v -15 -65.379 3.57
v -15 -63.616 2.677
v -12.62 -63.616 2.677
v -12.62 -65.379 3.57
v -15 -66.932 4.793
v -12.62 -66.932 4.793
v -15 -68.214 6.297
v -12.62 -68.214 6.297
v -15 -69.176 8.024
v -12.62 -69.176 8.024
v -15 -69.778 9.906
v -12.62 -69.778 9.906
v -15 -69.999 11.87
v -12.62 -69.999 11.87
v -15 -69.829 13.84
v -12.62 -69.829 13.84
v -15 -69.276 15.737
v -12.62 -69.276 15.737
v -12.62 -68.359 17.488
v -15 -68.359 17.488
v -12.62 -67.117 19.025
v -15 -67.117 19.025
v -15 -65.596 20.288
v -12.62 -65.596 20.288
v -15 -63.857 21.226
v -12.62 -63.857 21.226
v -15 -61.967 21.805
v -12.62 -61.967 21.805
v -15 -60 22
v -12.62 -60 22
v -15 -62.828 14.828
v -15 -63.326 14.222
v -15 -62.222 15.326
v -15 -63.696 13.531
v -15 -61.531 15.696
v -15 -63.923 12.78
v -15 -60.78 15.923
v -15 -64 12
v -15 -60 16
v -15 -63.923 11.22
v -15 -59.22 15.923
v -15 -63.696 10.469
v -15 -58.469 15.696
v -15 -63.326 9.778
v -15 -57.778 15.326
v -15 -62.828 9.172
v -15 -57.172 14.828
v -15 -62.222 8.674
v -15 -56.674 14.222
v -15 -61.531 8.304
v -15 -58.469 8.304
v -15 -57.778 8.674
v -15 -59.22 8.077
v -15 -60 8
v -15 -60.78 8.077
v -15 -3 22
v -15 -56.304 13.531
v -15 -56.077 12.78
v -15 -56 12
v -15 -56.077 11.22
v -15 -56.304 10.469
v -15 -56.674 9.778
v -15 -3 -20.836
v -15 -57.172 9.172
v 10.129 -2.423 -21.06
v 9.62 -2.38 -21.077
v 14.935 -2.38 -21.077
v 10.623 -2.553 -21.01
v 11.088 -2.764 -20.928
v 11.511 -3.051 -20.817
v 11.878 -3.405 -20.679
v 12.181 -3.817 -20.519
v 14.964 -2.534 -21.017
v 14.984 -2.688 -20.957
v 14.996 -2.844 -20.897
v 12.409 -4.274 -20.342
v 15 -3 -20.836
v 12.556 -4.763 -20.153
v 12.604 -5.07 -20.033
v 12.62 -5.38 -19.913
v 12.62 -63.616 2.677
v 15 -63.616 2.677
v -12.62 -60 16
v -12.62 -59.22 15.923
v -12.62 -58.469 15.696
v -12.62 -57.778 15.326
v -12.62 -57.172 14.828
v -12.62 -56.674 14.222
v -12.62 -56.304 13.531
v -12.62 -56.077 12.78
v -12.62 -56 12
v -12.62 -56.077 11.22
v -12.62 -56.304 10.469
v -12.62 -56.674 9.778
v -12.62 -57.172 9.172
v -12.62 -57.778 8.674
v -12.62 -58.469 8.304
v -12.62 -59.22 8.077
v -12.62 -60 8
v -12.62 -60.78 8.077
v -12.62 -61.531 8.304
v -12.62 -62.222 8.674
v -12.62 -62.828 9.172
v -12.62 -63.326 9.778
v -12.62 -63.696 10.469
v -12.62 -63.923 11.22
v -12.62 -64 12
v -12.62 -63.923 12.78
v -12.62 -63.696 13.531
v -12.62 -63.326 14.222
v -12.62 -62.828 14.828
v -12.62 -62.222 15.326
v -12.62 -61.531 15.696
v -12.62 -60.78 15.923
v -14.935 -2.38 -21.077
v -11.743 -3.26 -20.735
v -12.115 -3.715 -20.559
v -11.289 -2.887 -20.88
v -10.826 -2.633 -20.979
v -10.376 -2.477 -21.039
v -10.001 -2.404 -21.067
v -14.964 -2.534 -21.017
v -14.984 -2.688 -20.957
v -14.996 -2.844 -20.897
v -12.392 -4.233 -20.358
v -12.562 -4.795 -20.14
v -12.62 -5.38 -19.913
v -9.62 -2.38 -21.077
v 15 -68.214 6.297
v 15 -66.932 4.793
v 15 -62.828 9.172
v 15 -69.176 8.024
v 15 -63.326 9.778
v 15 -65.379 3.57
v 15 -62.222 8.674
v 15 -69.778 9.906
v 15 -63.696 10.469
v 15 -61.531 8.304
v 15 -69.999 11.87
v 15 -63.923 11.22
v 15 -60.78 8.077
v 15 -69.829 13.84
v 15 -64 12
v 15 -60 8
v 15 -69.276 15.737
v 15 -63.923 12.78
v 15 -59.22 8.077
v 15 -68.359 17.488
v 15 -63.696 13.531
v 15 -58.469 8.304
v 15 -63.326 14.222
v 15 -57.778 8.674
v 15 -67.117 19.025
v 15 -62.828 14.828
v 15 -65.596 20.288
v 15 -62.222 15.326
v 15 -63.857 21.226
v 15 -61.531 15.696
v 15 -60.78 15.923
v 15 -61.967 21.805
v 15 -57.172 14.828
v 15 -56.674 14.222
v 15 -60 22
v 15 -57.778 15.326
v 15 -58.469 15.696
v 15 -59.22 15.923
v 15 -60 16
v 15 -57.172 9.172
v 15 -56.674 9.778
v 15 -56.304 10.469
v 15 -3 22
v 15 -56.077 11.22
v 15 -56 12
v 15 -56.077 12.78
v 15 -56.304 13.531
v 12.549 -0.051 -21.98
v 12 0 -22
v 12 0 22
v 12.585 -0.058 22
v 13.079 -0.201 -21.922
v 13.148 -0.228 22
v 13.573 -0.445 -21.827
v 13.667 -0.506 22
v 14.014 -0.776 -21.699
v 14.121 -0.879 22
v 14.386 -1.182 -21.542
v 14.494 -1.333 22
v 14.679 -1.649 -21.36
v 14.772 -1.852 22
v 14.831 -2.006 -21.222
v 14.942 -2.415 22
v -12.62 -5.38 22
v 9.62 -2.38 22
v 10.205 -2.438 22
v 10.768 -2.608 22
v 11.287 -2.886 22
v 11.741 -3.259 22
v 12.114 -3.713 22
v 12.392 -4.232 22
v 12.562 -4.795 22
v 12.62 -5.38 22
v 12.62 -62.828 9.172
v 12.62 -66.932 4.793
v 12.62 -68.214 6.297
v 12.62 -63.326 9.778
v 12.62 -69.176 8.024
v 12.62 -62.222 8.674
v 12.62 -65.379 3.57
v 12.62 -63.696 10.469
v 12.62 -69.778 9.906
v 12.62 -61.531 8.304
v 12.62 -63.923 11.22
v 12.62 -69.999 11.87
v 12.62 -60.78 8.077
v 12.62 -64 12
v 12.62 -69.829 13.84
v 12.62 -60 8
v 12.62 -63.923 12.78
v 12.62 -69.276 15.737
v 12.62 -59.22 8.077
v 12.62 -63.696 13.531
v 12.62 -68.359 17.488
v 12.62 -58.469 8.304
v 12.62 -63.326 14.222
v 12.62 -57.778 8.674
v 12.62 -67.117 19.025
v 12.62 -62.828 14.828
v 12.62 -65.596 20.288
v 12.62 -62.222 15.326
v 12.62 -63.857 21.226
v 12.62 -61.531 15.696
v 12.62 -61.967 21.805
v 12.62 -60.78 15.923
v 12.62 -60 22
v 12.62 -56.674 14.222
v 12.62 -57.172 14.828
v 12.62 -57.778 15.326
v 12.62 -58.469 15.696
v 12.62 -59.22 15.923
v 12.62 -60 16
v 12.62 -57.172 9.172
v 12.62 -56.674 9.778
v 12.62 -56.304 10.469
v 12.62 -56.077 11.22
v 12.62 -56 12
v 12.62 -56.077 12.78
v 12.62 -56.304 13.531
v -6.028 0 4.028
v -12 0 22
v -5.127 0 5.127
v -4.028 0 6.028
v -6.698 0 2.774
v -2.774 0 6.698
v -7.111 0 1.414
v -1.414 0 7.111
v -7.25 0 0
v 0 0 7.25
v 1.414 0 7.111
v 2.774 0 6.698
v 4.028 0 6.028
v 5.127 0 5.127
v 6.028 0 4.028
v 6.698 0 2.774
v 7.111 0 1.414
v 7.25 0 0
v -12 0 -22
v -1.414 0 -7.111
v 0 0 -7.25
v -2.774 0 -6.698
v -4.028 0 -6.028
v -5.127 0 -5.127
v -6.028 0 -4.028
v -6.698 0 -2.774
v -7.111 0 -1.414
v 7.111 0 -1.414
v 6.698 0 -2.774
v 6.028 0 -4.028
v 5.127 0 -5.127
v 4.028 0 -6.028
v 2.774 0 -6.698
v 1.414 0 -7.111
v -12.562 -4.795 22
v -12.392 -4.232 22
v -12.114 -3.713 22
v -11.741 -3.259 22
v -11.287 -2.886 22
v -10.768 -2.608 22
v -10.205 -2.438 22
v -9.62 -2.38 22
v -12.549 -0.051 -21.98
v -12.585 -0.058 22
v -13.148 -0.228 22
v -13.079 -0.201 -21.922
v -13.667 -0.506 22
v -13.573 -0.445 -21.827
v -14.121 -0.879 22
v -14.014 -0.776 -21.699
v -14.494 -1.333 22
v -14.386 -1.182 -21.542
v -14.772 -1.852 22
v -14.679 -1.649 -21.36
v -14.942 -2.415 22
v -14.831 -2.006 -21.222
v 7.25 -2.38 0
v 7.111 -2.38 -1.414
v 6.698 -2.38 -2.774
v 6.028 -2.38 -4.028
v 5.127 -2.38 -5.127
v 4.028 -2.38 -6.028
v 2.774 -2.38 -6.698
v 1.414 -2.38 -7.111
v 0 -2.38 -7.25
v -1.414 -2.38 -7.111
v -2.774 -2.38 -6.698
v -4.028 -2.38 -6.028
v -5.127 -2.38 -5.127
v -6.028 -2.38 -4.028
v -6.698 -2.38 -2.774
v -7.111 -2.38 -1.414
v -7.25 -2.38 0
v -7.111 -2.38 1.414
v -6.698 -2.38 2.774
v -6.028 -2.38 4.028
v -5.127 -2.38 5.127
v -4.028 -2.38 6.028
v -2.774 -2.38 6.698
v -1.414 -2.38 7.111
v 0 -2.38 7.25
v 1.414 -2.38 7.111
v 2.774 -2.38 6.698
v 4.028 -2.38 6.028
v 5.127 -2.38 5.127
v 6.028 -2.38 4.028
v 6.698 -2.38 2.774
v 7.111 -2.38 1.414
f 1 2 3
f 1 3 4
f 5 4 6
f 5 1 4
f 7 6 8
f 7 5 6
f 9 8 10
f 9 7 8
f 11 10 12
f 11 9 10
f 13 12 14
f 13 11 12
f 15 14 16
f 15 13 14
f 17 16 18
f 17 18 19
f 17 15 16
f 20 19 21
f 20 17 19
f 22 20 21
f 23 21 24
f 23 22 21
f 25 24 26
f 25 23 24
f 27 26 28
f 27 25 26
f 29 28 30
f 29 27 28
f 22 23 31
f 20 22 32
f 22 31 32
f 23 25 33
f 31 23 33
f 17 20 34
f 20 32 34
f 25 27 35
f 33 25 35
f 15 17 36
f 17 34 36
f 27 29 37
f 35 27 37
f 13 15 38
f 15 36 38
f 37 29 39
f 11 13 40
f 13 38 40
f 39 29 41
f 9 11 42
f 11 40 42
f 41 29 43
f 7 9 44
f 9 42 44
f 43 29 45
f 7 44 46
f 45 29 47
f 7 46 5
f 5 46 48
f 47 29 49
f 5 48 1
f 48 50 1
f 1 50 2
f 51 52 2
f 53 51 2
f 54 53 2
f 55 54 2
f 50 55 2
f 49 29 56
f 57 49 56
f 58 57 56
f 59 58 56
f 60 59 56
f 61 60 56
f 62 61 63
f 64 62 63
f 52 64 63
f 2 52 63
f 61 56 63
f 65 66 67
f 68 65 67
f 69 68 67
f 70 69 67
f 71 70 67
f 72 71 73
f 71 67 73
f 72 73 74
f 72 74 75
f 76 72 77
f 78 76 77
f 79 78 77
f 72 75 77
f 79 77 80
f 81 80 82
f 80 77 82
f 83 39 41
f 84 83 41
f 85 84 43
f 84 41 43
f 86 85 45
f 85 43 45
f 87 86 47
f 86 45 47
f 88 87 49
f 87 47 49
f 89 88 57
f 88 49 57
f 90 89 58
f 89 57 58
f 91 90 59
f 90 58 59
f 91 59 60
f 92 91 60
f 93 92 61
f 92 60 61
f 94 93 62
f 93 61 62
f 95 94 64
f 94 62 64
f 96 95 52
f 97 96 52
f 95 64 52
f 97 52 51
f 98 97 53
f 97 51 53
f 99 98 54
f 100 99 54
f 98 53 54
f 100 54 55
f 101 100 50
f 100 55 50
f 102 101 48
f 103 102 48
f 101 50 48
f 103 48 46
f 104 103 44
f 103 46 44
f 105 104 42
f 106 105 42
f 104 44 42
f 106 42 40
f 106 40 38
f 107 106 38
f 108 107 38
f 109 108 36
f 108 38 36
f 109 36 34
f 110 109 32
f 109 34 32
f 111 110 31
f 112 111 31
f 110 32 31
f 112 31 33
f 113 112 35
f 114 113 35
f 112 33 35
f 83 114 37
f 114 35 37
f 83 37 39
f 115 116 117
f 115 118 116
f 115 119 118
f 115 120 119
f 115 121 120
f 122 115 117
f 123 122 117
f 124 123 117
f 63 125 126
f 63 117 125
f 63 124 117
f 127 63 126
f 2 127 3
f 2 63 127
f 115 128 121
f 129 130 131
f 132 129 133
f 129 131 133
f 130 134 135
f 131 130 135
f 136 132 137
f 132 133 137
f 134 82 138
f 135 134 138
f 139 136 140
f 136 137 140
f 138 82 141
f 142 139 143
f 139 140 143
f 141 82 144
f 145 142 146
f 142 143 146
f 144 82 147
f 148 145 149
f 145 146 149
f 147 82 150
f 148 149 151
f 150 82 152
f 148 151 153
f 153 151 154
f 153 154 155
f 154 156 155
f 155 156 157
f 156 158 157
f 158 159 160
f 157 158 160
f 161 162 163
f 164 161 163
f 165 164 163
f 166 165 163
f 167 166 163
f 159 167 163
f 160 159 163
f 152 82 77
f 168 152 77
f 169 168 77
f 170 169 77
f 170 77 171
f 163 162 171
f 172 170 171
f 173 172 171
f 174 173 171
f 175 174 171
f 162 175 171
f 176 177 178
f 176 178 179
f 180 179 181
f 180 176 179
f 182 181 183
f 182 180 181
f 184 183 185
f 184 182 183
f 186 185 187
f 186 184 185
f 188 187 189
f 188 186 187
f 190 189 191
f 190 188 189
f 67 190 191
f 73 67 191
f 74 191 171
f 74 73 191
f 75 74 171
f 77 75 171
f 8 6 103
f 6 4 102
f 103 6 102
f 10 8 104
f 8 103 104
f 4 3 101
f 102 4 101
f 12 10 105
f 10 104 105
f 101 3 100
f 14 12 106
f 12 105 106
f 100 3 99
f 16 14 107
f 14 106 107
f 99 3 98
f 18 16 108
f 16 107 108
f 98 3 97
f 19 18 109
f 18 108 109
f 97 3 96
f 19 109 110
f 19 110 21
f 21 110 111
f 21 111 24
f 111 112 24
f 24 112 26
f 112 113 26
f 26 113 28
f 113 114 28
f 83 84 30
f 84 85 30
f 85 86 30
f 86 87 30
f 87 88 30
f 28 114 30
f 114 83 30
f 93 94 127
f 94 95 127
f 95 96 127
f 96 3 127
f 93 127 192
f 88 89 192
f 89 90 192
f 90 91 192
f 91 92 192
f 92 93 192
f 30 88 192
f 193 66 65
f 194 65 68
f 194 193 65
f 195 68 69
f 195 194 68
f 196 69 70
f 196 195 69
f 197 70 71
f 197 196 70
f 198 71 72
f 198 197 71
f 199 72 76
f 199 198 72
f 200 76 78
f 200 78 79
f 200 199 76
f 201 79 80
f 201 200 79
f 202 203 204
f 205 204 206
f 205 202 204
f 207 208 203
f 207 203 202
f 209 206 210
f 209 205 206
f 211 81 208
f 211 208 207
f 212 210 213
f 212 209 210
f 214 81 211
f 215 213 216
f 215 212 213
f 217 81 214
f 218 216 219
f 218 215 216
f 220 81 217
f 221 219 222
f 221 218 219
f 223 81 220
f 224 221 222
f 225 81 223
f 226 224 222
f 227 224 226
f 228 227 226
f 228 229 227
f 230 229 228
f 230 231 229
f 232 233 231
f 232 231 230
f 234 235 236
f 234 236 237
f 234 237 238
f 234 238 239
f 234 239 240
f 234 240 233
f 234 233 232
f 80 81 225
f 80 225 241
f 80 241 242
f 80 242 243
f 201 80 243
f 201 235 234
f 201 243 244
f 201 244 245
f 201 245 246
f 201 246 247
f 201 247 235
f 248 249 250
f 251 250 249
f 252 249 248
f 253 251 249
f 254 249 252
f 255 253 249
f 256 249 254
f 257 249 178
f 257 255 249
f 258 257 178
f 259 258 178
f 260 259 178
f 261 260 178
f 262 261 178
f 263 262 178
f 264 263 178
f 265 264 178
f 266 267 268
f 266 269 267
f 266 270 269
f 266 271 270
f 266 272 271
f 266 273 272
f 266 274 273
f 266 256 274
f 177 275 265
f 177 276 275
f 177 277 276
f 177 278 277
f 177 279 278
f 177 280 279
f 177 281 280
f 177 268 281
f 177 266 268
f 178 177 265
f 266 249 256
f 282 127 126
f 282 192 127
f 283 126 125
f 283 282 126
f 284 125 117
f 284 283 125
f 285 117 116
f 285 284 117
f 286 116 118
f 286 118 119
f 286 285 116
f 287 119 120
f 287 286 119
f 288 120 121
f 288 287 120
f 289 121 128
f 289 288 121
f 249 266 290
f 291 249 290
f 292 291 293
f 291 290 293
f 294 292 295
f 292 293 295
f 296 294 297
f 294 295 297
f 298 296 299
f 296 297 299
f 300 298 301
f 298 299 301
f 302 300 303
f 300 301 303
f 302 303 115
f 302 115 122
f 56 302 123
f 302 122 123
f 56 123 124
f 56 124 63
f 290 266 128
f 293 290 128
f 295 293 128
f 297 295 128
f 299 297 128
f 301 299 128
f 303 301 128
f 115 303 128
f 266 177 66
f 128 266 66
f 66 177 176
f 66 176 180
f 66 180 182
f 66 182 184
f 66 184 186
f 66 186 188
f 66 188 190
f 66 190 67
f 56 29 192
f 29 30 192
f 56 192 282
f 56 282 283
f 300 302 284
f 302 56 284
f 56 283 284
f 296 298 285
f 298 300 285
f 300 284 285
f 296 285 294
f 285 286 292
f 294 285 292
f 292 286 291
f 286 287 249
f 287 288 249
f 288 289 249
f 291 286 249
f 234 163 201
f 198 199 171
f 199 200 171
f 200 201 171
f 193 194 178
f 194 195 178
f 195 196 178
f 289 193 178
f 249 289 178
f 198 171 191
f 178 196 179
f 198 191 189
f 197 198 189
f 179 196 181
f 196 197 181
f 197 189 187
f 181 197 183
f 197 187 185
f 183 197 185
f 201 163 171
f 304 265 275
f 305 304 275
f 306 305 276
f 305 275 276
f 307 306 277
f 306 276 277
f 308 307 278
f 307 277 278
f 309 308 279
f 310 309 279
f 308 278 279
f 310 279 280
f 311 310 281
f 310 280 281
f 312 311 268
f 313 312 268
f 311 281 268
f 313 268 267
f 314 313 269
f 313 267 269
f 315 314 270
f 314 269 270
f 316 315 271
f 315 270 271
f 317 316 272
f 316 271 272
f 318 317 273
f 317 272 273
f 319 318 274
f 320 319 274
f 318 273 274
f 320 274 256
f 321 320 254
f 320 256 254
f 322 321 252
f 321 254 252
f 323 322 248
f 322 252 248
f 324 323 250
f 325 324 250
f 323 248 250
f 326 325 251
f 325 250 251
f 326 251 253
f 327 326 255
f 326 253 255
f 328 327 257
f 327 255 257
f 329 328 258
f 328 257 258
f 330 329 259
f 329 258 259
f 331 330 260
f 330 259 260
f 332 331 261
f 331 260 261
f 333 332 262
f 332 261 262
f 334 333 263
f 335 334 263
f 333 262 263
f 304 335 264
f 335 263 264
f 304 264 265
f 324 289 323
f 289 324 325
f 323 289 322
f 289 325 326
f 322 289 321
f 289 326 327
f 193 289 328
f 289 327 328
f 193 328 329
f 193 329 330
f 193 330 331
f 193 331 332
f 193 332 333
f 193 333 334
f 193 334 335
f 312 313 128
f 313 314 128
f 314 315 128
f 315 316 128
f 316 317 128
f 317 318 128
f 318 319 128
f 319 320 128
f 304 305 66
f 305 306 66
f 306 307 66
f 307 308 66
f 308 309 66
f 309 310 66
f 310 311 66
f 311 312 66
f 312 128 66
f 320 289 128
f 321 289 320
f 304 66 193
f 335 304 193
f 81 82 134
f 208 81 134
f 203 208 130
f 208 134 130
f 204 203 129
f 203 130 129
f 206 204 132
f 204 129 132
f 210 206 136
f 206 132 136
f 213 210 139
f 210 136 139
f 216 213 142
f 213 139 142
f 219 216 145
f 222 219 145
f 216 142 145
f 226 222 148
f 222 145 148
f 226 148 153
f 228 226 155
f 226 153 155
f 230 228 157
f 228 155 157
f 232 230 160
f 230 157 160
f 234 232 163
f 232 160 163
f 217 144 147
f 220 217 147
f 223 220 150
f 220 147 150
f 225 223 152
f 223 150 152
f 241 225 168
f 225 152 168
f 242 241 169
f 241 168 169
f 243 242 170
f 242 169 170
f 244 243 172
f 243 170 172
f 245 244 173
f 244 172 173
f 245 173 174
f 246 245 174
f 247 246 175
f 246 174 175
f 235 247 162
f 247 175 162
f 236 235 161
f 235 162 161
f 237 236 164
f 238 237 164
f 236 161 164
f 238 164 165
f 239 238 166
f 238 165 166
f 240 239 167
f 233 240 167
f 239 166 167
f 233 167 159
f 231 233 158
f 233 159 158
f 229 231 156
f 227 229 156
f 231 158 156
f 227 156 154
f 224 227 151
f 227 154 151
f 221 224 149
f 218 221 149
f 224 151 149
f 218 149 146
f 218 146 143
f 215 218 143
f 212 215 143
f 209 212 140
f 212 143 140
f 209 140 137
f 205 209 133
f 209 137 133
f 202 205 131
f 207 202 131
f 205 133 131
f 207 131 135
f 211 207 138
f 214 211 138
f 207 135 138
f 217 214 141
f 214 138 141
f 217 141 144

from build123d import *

# Parameters (mm, degrees)
CROQUIS1_W              = 30
CROQUIS1_H              = 44
CROQUIS1_R              = 7.25
SALIENTE_EXTRUIR1_DEPTH = 2.38
CROQUIS2_R              = 4
SALIENTE_EXTRUIR2_DEPTH = 2.38
CORTAR_EXTRUIR1_DEPTH   = 31
CROQUIS4_R              = 4
SALIENTE_EXTRUIR3_DEPTH = 2.38
REDONDEO1_R             = 3
REDONDEO2_R             = 3
REDONDEO3_R             = 3


with BuildPart() as part:
    # Croquis1 → Saliente-Extruir1 (new body)
    with BuildSketch(Plane(origin=(0, 0, 0), x_dir=(1, 0, 0), z_dir=(0, 1, 0))):
        Rectangle(CROQUIS1_W, CROQUIS1_H)
        Circle(CROQUIS1_R, mode=Mode.SUBTRACT)
    extrude(amount=-SALIENTE_EXTRUIR1_DEPTH)

    # Croquis2 → Saliente-Extruir2 (add)
    with BuildSketch(Plane(origin=(15, 0, 0), x_dir=(0, 0, -1), z_dir=(1, 0, 0))):
        with BuildLine():
            Line((-22, -60), (-22, 0))
            Line((-22, 0), (22, 0))
            Line((22, 0), (-2.676843343, -63.616455439))
            ThreePointArc((-2.676843343, -63.616455439), (-13.839624069, -69.8293328), (-22, -60))
        make_face()
        with Locations((-12, -60)):
            Circle(CROQUIS2_R, mode=Mode.SUBTRACT)
    extrude(amount=-SALIENTE_EXTRUIR2_DEPTH)

    # Croquis3 → Cortar-Extruir1 (cut, through all)
    with BuildSketch(Plane(origin=(15, 0, 0), x_dir=(0, 0, -1), z_dir=(1, 0, 0))):
        Polygon((22, 0), (21.076797241, -2.38), (22, -2.38), align=None)
    extrude(amount=-CORTAR_EXTRUIR1_DEPTH, mode=Mode.SUBTRACT)

    # Croquis4 → Saliente-Extruir3 (add)
    with BuildSketch(Plane.ZY.offset(15)):
        with BuildLine():
            Line((-22, 0), (2.676843343, -63.616455439))
            ThreePointArc((2.676843343, -63.616455439), (13.839624069, -69.8293328), (22, -60))
            Line((22, -60), (22, 0))
            Line((22, 0), (-22, 0))
        make_face()
        with Locations((12, -60)):
            Circle(CROQUIS4_R, mode=Mode.SUBTRACT)
    extrude(amount=-SALIENTE_EXTRUIR3_DEPTH)

    # Redondeo1
    redondeo1_edges = [part.edges().sort_by_distance(p)[0] for p in [
        (12.62, -2.38, 0.461601379),
    ]]
    fillet(redondeo1_edges, radius=REDONDEO1_R)

    # Redondeo2
    redondeo2_edges = [part.edges().sort_by_distance(p)[0] for p in [
        (-12.62, -2.38, 0.461601379),
    ]]
    fillet(redondeo2_edges, radius=REDONDEO2_R)

    # Redondeo3
    redondeo3_edges = [part.edges().sort_by_distance(p)[0] for p in [
        (-15, 0, 0),
        (15, 0, 0),
    ]]
    fillet(redondeo3_edges, radius=REDONDEO3_R)


solid = part.part
